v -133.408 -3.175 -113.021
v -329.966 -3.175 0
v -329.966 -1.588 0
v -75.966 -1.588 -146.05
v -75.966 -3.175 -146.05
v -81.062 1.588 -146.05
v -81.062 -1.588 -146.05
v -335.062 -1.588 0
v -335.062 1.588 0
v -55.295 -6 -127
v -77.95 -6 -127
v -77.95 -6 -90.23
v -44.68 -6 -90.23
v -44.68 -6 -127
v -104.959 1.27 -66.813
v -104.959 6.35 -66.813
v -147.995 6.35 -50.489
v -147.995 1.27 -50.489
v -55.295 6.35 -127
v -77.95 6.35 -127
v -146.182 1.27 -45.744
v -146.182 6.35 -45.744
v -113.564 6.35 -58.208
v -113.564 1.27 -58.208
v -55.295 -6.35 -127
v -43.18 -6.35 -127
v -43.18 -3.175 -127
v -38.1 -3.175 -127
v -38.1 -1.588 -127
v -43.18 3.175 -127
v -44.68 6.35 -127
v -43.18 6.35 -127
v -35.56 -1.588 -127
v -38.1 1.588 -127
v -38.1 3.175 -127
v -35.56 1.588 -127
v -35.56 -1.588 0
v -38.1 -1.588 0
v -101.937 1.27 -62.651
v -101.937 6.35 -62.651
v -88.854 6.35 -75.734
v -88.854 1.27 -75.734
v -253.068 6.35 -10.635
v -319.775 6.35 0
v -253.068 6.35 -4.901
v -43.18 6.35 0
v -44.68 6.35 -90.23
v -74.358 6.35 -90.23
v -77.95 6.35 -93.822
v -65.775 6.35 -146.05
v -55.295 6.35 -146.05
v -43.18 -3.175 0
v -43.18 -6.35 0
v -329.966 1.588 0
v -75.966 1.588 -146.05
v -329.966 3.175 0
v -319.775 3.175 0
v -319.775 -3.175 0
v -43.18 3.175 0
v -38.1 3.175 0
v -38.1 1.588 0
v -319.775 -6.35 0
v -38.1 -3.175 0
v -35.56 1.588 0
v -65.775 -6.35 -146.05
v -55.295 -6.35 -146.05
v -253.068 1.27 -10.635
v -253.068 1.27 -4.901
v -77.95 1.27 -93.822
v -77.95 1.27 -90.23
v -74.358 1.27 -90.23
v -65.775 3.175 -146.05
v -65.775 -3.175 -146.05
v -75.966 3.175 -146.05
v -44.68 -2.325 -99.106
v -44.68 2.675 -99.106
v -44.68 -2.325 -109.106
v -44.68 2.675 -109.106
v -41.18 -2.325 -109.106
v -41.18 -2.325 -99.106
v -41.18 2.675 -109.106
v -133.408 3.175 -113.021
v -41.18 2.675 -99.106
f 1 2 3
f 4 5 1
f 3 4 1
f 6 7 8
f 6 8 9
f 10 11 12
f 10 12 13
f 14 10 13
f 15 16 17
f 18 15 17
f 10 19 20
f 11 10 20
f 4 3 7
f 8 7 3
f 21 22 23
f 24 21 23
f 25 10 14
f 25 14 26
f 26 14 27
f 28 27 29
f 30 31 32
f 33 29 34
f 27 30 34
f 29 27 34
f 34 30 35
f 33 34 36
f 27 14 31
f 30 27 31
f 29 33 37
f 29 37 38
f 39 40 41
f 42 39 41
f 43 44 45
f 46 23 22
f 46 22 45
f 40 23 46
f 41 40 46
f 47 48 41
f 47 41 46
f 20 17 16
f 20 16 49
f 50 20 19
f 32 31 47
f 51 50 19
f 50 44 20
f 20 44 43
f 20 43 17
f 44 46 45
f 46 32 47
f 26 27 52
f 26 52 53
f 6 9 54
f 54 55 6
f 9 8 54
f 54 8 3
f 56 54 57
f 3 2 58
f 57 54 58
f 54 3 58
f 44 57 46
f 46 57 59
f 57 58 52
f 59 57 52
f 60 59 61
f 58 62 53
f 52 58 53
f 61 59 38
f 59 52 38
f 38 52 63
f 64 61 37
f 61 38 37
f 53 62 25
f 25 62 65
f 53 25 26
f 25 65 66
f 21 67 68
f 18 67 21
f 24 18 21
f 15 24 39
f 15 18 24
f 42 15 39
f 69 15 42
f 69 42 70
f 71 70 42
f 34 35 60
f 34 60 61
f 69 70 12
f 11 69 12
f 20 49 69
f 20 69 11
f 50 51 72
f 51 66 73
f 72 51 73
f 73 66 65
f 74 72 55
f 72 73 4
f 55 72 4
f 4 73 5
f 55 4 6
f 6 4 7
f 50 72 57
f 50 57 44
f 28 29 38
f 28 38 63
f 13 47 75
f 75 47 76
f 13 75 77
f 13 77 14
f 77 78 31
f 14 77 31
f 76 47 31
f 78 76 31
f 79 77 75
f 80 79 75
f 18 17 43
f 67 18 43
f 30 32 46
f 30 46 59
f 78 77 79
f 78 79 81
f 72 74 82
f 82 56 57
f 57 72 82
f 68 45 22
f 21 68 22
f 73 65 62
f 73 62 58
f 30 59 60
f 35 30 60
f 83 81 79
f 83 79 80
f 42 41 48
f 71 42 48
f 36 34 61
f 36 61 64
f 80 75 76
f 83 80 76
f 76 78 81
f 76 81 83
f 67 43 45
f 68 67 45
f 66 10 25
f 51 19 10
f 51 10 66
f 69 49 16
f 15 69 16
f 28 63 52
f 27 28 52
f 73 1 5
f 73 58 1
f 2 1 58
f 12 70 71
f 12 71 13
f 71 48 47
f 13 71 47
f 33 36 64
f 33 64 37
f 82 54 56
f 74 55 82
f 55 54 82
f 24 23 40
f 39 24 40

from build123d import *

# Parameters (mm, degrees)
BOSS_EXTRUDE1_DEPTH      = 6.35
BOSS_EXTRUDE1_DEPTH_BACK = 6.35
SKETCH2_W                = 292.995908675
SKETCH2_H                = 3.175
CUT_EXTRUDE1_DEPTH       = 38.1
SKETCH3_W                = 146.05
SKETCH3_H                = 3.175
CUT_EXTRUDE2_DEPTH       = 38.1
CUT_EXTRUDE3_DEPTH       = 3.175
CUT_EXTRUDE4_DEPTH       = 3.175
SKETCH6_W                = 5.08
SKETCH6_H                = 3.175
CUT_EXTRUDE5_DEPTH       = 157.099
CUT_EXTRUDE6_DEPTH       = 339.217
CUT_EXTRUDE6_DEPTH_BACK  = 157.099
SKETCH9_W                = 50.8
SKETCH9_H                = 19.05
CUT_EXTRUDE7_DEPTH       = 21.59
SKETCH10_W               = 33.269999954
SKETCH10_H               = 36.77000012
CUT_EXTRUDE9_DEPTH       = 12.35
SKETCH11_W               = 4.495000048
SKETCH11_H               = 19.05
CUT_EXTRUDE10_DEPTH      = 366.729881683
CUT_EXTRUDE11_DEPTH      = 5.08
SKETCH13_W               = 10.000000066
SKETCH13_H               = 4.999999906
CUT_EXTRUDE13_DEPTH      = 3.5


with BuildPart() as part:
    # Sketch1 → Boss-Extrude1 (new, two sides: drawn at the far end of the back side and taken through both)
    with BuildSketch(Plane(origin=(0, 0, 0), x_dir=(1, 0, 0), z_dir=(0, 1, 0)).offset(-BOSS_EXTRUDE1_DEPTH_BACK)):
        Polygon((-406.4, 0), (0, 0), (0, 146.05), (-152.4, 146.05), align=None)
    extrude(amount=BOSS_EXTRUDE1_DEPTH + BOSS_EXTRUDE1_DEPTH_BACK)

    # Sketch2 → Cut-Extrude1 (cut)
    with BuildSketch(Plane(origin=(-100.979614843, 0, -175.616721465), x_dir=(-0.8669063030575352, 0, 0.49847112425808277), z_dir=(-0.4984711242580827, 0, -0.8669063030575351))):
        with Locations((205.812767226, 4.7625)):
            Rectangle(SKETCH2_W, SKETCH2_H)
        with Locations((205.812767226, -4.7625)):
            Rectangle(SKETCH2_W, SKETCH2_H)
    extrude(amount=-CUT_EXTRUDE1_DEPTH, mode=Mode.SUBTRACT)

    # Sketch3 → Cut-Extrude2 (cut)
    with BuildSketch(Plane(origin=(0, 0, 0), x_dir=(0, 0, -1), z_dir=(1, 0, 0))):
        with Locations((73.025, 4.7625)):
            Rectangle(SKETCH3_W, SKETCH3_H)
        with Locations((73.025, -4.7625)):
            Rectangle(SKETCH3_W, SKETCH3_H)
    extrude(amount=-CUT_EXTRUDE2_DEPTH, mode=Mode.SUBTRACT)

    # Sketch4 → Cut-Extrude3 (cut)
    with BuildSketch(Plane(origin=(0, 6.35, 0), x_dir=(1, 0, 0), z_dir=(0, 1, 0))):
        Polygon((-133.408250166, 113.020869854), (-75.966284694, 146.05), (-152.4, 146.05), align=None)
    extrude(amount=-CUT_EXTRUDE3_DEPTH, mode=Mode.SUBTRACT)

    # Sketch5 → Cut-Extrude4 (cut)
    with BuildSketch(Plane.XZ.offset(6.35)):
        Polygon((-133.408250166, -113.020869854), (-75.966284694, -146.05), (-152.4, -146.05), align=None)
    extrude(amount=-CUT_EXTRUDE4_DEPTH, mode=Mode.SUBTRACT)

    # Sketch6 → Cut-Extrude5 (cut)
    with BuildSketch(Plane(origin=(0, 0, -146.05), x_dir=(-1, 0, 0), z_dir=(0, 0, -1))):
        Polygon((0, -3.175), (38.1, -3.175), (38.1, -1.5875), (35.56, -1.5875), (35.56, 1.5875), (38.1, 1.5875), (38.1, 3.175), (0, 3.175), align=None)
        with Locations((40.64, -4.7625)):
            Rectangle(SKETCH6_W, SKETCH6_H)
        with Locations((40.64, 4.7625)):
            Rectangle(SKETCH6_W, SKETCH6_H)
    extrude(amount=-CUT_EXTRUDE5_DEPTH, mode=Mode.SUBTRACT)

    # Sketch8 → Cut-Extrude6 (cut, two sides: drawn at the far end of the back side and taken through both)
    with BuildSketch(Plane(origin=(-51.420385157, 0, 29.566721465), x_dir=(0.49847112425808243, 0, 0.8669063030575355), z_dir=(-0.8669063030575355, 0, 0.49847112425808243)).offset(-CUT_EXTRUDE6_DEPTH_BACK)):
        Polygon((-164.478664898, 1.5875), (-164.478664898, 3.175), (-159.398664898, 3.175), (-159.398664898, 6.35), (-164.478664898, 6.35), (-202.578664898, 6.35), (-202.578664898, -6.35), (-164.478664898, -6.35), (-159.398664898, -6.35), (-159.398664898, -3.175), (-164.478664898, -3.175), (-164.478664898, -1.5875), (-167.018664898, -1.5875), (-167.018664898, 1.5875), align=None)
    extrude(amount=CUT_EXTRUDE6_DEPTH + CUT_EXTRUDE6_DEPTH_BACK, mode=Mode.SUBTRACT)

    # Sketch9 → Cut-Extrude7 (cut)
    with BuildSketch(Plane(origin=(0, 6.35, 0), x_dir=(1, 0, 0), z_dir=(0, 1, 0))):
        with Locations((-25.4, 136.525)):
            Rectangle(SKETCH9_W, SKETCH9_H)
    extrude(amount=-CUT_EXTRUDE7_DEPTH, mode=Mode.SUBTRACT)

    # Sketch10 → Cut-Extrude9 (cut)
    with BuildSketch(Plane(origin=(0, 6.35, 0), x_dir=(1, 0, 0), z_dir=(0, 1, 0))):
        with Locations((-61.315000025, 108.61499994)):
            Rectangle(SKETCH10_W, SKETCH10_H)
    extrude(amount=-CUT_EXTRUDE9_DEPTH, mode=Mode.SUBTRACT)

    # Sketch11 → Cut-Extrude10 (cut, through all)
    with BuildSketch(Plane(origin=(0, 6.35, 0), x_dir=(1, 0, 0), z_dir=(0, 1, 0))):
        with Locations((-53.047500024, 136.525)):
            Rectangle(SKETCH11_W, SKETCH11_H)
    extrude(amount=-CUT_EXTRUDE10_DEPTH, mode=Mode.SUBTRACT)

    # Sketch12 → Cut-Extrude11 (cut)
    with BuildSketch(Plane(origin=(0, 6.35, 0), x_dir=(1, 0, 0), z_dir=(0, 1, 0))):
        Polygon((-74.357897554, 90.22999988), (-77.950000002, 90.22999988), (-77.950000002, 93.822102328), (-104.958896043, 66.813206287), (-253.068107346, 10.634854577), (-253.068107346, 4.900877803), (-101.937140583, 62.65075685), align=None)
    extrude(amount=-CUT_EXTRUDE11_DEPTH, mode=Mode.SUBTRACT)

    # Sketch13 → Cut-Extrude13 (cut)
    with BuildSketch(Plane.ZY.offset(44.680000048)):
        with Locations((-104.106, 0.175)):
            Rectangle(SKETCH13_W, SKETCH13_H)
    extrude(amount=-CUT_EXTRUDE13_DEPTH, mode=Mode.SUBTRACT)


solid = part.part
